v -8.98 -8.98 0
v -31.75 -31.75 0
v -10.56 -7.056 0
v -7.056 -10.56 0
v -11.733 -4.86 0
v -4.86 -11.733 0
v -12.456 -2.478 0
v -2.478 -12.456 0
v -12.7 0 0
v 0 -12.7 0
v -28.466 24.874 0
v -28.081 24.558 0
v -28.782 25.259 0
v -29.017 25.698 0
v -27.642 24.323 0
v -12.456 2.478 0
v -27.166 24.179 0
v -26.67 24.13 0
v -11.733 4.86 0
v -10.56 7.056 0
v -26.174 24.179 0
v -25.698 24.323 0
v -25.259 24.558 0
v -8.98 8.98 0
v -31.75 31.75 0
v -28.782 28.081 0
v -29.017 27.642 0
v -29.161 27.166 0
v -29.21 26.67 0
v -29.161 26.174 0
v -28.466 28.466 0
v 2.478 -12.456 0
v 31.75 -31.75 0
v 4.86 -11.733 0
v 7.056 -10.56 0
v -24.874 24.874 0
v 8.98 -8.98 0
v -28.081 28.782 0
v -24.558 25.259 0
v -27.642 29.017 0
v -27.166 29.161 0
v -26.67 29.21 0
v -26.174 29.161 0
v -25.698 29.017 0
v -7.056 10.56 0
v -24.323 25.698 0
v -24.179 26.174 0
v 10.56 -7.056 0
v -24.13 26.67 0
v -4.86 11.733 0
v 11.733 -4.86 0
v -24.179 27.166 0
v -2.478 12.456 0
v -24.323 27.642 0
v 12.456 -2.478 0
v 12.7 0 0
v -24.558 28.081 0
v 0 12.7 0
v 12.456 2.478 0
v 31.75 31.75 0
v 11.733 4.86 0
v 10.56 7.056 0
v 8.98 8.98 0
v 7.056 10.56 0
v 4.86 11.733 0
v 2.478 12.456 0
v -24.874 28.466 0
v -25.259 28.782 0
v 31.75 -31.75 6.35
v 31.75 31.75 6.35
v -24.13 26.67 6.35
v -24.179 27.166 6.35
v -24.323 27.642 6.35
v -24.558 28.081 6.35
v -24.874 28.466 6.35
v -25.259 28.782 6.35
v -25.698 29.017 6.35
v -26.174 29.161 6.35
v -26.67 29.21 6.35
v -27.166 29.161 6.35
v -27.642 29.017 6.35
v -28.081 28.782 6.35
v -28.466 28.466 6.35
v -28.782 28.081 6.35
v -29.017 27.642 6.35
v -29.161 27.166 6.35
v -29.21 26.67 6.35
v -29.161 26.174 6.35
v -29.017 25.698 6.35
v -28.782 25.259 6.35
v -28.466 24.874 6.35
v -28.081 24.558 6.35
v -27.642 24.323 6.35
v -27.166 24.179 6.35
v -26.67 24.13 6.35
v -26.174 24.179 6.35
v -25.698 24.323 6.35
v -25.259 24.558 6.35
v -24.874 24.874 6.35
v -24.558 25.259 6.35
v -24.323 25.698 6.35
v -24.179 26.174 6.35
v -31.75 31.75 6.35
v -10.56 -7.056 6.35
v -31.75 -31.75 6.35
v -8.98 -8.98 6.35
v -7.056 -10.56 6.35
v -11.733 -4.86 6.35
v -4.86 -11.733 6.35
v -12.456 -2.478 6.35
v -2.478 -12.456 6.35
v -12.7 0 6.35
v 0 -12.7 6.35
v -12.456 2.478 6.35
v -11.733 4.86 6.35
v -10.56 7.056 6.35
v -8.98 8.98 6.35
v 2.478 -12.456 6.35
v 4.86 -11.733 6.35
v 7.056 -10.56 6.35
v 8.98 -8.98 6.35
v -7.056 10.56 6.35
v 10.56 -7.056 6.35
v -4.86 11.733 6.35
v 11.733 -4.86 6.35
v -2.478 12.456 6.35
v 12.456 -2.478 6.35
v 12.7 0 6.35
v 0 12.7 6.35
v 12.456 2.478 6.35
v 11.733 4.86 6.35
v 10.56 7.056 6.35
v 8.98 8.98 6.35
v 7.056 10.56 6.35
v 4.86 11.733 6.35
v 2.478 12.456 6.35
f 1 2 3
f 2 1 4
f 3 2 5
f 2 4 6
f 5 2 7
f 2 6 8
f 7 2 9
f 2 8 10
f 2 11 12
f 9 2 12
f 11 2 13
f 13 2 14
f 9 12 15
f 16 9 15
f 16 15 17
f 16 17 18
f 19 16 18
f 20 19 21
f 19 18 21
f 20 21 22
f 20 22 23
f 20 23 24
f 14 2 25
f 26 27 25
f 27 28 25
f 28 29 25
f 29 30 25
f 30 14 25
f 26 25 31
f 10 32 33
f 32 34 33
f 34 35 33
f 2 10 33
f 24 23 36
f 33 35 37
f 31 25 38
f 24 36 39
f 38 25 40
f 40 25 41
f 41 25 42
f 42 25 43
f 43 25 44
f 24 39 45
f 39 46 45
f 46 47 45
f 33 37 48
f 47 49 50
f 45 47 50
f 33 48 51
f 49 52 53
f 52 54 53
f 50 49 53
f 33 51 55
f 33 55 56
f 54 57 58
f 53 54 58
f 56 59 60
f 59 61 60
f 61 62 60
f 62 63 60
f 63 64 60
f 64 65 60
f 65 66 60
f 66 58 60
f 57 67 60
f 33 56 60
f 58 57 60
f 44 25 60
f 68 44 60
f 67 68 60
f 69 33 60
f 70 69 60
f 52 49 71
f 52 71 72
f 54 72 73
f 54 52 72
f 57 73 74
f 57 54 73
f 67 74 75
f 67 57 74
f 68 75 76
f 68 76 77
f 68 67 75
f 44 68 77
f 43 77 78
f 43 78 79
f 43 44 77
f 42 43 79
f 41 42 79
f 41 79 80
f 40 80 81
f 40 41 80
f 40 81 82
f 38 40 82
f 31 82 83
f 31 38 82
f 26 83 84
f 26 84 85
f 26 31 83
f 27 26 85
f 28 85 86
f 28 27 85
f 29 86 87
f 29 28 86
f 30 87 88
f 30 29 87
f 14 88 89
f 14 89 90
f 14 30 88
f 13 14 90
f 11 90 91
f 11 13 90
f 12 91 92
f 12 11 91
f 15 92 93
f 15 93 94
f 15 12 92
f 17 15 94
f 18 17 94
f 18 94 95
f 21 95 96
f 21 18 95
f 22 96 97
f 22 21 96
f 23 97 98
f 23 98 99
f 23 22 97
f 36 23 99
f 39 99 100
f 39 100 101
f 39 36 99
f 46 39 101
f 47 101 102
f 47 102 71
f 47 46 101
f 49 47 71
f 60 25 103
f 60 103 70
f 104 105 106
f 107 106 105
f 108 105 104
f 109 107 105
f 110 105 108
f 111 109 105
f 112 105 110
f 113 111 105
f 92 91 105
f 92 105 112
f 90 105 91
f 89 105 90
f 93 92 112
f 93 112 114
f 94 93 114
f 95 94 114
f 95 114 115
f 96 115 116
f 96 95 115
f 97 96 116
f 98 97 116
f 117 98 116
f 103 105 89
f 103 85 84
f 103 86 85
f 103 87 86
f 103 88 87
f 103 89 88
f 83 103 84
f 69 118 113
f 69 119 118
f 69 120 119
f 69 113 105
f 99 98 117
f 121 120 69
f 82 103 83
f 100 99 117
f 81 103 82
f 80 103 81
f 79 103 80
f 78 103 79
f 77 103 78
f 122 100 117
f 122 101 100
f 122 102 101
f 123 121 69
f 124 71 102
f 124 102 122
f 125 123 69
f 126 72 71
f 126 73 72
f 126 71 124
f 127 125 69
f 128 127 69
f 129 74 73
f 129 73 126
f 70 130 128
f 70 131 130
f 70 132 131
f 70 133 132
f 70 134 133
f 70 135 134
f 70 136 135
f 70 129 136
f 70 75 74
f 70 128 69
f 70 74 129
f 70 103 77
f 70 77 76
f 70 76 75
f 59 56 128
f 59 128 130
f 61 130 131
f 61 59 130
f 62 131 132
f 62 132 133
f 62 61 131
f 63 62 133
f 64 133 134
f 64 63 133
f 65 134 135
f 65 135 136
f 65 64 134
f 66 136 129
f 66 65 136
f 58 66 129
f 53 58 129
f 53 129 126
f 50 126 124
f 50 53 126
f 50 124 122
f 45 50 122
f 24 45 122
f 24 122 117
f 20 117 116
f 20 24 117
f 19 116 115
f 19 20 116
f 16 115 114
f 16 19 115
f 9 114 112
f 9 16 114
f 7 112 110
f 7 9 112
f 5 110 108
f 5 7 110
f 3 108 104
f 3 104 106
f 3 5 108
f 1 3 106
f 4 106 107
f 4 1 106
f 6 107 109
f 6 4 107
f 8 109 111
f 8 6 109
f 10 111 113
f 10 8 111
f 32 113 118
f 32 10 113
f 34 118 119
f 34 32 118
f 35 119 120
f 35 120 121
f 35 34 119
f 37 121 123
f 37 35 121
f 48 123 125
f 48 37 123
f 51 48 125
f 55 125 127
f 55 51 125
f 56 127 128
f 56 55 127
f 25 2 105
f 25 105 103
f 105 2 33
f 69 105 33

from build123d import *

# Parameters (mm, degrees)
F0_W     = 63.5
F0_H     = 63.5
F1_DEPTH = 6.35
F2_R     = 12.7
F3_DEPTH = 6.35
F4_R     = 2.54
F5_DEPTH = 6.35


with BuildPart() as f1:
    # F0 (on Top) → F1 (new body)
    with BuildSketch(Plane.XY):
        Rectangle(F0_W, F0_H)
    extrude(amount=F1_DEPTH)

    # F2 (on Top) → F3 (cut, through all)
    with BuildSketch(Plane.XY):
        Circle(F2_R)
    extrude(amount=F3_DEPTH, mode=Mode.SUBTRACT)

    # F4 (on Top) → F5 (cut, through all)
    with BuildSketch(Plane.XY):
        with Locations((-26.67, 26.67)):
            Circle(F4_R)
    extrude(amount=F5_DEPTH, mode=Mode.SUBTRACT)


solid = f1.part
